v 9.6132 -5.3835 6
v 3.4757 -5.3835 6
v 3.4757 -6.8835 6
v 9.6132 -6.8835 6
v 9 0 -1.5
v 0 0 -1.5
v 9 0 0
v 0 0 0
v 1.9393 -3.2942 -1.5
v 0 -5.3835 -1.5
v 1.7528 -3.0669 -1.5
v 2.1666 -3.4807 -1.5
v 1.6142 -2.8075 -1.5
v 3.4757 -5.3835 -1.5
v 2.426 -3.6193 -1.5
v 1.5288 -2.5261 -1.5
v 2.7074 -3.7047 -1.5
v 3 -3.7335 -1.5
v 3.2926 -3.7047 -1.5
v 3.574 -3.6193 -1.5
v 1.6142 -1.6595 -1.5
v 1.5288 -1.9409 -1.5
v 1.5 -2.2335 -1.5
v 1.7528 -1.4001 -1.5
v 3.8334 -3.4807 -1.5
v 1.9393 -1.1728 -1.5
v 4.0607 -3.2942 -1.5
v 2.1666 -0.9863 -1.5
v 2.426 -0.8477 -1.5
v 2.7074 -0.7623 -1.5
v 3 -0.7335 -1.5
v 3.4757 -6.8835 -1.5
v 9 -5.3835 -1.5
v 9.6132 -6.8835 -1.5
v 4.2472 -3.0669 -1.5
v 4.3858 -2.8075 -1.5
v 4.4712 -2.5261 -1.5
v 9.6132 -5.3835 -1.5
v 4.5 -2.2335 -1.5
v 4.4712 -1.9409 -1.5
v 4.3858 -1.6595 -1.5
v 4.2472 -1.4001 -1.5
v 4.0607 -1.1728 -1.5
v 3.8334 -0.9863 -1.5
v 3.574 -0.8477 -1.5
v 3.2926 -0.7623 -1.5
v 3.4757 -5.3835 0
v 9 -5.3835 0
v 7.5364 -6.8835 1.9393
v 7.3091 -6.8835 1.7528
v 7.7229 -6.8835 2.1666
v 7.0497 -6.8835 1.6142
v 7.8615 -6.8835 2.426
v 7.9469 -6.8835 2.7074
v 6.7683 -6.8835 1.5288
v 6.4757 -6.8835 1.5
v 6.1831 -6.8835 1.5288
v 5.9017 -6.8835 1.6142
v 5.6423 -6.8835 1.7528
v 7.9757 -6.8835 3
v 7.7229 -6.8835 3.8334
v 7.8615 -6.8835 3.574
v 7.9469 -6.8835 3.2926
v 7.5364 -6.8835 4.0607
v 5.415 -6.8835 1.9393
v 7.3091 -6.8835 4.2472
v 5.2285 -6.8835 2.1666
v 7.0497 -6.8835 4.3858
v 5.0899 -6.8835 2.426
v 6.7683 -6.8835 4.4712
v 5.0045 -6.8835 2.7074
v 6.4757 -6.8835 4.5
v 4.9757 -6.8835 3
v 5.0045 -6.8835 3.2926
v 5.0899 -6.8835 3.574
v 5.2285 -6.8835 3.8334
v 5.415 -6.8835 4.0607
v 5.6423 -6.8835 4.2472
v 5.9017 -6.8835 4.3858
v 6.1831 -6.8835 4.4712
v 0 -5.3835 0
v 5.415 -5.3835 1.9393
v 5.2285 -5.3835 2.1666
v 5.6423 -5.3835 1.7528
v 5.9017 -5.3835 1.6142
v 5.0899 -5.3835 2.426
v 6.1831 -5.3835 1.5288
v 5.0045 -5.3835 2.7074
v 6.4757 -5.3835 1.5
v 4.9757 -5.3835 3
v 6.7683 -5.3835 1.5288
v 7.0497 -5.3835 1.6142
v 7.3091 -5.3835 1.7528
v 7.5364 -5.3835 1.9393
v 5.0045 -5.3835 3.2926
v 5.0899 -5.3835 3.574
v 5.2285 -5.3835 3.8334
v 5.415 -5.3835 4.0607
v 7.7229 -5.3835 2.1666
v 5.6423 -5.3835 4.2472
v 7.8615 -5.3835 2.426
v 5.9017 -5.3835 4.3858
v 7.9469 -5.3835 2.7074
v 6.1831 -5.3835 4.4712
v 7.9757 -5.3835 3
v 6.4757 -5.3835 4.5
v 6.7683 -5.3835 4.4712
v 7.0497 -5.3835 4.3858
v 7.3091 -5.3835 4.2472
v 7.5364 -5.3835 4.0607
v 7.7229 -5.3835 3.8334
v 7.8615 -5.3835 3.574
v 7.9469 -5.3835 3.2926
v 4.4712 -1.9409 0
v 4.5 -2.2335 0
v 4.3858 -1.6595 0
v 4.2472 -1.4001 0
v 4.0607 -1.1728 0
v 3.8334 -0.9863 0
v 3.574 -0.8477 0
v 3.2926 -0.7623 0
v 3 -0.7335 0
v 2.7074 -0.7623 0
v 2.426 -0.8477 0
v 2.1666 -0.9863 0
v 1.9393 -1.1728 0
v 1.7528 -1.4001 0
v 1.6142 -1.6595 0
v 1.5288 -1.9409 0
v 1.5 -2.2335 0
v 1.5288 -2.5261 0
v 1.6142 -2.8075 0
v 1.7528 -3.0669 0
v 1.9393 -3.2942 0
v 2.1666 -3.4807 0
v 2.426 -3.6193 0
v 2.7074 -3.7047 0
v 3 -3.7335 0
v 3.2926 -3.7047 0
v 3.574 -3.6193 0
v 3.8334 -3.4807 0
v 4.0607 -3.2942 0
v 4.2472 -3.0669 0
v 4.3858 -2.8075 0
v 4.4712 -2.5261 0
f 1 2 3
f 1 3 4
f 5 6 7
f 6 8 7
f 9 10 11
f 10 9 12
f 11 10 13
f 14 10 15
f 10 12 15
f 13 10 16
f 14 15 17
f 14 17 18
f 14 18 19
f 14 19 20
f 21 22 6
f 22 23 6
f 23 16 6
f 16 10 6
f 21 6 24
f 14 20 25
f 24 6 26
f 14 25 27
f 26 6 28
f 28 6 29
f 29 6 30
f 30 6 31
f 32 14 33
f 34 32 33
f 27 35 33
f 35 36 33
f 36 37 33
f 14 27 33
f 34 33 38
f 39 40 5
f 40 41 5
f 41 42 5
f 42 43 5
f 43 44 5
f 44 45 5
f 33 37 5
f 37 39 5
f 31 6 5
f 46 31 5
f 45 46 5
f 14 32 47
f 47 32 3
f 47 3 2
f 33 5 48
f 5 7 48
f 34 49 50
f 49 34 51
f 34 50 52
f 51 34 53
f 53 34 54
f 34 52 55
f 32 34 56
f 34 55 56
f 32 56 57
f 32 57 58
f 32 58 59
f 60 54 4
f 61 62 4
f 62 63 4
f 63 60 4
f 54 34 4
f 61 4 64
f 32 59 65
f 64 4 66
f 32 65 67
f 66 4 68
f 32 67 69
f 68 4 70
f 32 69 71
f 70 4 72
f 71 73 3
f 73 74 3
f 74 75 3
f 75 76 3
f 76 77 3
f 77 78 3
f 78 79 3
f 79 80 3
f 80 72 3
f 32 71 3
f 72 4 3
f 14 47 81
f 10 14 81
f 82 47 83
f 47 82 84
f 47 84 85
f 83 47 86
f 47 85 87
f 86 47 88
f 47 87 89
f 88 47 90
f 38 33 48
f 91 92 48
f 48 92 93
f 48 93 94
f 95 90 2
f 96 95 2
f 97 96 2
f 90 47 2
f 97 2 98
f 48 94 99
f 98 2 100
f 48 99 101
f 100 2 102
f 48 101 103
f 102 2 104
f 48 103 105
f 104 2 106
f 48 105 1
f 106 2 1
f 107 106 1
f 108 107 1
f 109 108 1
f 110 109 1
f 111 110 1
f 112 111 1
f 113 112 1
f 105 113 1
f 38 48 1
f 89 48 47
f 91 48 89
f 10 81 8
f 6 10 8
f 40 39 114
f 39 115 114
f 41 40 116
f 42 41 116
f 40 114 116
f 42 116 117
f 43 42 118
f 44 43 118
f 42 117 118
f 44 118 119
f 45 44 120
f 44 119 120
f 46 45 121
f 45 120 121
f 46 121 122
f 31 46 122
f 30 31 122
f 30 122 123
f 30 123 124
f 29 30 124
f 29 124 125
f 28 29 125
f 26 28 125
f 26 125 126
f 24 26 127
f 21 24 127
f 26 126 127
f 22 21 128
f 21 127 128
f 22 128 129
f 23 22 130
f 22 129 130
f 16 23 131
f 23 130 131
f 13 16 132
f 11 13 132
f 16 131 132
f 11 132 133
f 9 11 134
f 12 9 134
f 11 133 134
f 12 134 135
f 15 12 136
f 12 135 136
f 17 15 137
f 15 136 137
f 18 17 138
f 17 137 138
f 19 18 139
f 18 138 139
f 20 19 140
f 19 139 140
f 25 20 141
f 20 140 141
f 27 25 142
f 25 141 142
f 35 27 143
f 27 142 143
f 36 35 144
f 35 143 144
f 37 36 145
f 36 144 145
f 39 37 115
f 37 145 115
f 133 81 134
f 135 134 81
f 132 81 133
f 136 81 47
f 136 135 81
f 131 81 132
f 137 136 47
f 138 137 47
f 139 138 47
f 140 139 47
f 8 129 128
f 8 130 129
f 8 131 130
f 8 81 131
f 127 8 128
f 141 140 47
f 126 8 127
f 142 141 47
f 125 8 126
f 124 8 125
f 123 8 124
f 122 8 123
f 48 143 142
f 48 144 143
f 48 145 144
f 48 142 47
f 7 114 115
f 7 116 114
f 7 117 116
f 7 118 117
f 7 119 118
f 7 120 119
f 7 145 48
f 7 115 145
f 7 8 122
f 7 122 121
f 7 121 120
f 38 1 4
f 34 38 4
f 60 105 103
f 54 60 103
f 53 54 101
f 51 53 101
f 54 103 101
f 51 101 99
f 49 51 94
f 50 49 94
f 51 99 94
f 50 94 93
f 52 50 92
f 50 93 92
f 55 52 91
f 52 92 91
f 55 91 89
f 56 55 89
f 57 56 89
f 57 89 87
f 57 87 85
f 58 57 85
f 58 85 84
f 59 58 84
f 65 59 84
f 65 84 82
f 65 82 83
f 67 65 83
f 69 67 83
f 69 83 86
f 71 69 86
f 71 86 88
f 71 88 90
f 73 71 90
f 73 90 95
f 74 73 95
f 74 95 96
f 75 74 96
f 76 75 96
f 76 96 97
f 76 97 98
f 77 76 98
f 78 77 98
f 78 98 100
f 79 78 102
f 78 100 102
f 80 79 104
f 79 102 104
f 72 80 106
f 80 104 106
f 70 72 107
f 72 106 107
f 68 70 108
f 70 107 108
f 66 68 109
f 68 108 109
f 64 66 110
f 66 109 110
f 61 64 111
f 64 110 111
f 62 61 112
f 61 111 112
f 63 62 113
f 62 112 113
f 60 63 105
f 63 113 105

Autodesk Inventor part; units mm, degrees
ref_plane "YZ Plane" through (0, 0, 0) normal (1, 0, 0) x (0, 1, 0)
ref_plane "XZ Plane" through (0, 0, 0) normal (0, 1, 0) x (-1, 0, 0)
ref_plane "XY Plane" through (0, 0, 0) normal (0, 0, 1) x (1, 0, 0)
sketch "Sketch1" plane through (0, 0, 0) normal (0, 0, 1) x (1, 0, 0)
  line L0 (0, 0) -> (9, 0)
  line L1 (9, 0) -> (9, -5.3835)
  line L2 (9, -5.3835) -> (0, -5.3835)
  line L3 (0, -5.3835) -> (0, 0)
  circle A0 centre (3, -2.2335) radius 1.5
  line L4 (3.4757, -5.3835) -> (9.6132, -5.3835)
  line L5 (9.6132, -5.3835) -> (9.6132, -6.8835)
  line L6 (9.6132, -6.8835) -> (3.4757, -6.8835)
  line L7 (3.4757, -6.8835) -> (3.4757, -5.3835)
  dimension "d0" = 3
  dimension "d1" = 3.15
  dimension "d8" = 1.5
extrude "Extrusion1" add sketch "Sketch1" against normal blind 1.5
extrude "Extrusion2" add sketch "Sketch1" along normal blind 6 and the other way blind 1 contours L4 L5 L6 L7 L2
sketch "Sketch2" plane through (3.4757, -5.3835, 0) normal (0, 1, 0) x (1, 0, 0)
  circle A0 centre (3, -3) radius 1.5
  line L0 (1.0243, 0) -> (-1.9757, 0) projected
  line L1 (0, 0) -> (0, -6) projected
  point P0 (-3.4757, 0)
  point P1 (-0.4757, 0)
  dimension "d9" = 3
  dimension "d10" = 3
  dimension "d11" = 3
extrude "Extrusion3" cut sketch "Sketch2" against normal blind 1.5
properties part number "IMU_holder"
